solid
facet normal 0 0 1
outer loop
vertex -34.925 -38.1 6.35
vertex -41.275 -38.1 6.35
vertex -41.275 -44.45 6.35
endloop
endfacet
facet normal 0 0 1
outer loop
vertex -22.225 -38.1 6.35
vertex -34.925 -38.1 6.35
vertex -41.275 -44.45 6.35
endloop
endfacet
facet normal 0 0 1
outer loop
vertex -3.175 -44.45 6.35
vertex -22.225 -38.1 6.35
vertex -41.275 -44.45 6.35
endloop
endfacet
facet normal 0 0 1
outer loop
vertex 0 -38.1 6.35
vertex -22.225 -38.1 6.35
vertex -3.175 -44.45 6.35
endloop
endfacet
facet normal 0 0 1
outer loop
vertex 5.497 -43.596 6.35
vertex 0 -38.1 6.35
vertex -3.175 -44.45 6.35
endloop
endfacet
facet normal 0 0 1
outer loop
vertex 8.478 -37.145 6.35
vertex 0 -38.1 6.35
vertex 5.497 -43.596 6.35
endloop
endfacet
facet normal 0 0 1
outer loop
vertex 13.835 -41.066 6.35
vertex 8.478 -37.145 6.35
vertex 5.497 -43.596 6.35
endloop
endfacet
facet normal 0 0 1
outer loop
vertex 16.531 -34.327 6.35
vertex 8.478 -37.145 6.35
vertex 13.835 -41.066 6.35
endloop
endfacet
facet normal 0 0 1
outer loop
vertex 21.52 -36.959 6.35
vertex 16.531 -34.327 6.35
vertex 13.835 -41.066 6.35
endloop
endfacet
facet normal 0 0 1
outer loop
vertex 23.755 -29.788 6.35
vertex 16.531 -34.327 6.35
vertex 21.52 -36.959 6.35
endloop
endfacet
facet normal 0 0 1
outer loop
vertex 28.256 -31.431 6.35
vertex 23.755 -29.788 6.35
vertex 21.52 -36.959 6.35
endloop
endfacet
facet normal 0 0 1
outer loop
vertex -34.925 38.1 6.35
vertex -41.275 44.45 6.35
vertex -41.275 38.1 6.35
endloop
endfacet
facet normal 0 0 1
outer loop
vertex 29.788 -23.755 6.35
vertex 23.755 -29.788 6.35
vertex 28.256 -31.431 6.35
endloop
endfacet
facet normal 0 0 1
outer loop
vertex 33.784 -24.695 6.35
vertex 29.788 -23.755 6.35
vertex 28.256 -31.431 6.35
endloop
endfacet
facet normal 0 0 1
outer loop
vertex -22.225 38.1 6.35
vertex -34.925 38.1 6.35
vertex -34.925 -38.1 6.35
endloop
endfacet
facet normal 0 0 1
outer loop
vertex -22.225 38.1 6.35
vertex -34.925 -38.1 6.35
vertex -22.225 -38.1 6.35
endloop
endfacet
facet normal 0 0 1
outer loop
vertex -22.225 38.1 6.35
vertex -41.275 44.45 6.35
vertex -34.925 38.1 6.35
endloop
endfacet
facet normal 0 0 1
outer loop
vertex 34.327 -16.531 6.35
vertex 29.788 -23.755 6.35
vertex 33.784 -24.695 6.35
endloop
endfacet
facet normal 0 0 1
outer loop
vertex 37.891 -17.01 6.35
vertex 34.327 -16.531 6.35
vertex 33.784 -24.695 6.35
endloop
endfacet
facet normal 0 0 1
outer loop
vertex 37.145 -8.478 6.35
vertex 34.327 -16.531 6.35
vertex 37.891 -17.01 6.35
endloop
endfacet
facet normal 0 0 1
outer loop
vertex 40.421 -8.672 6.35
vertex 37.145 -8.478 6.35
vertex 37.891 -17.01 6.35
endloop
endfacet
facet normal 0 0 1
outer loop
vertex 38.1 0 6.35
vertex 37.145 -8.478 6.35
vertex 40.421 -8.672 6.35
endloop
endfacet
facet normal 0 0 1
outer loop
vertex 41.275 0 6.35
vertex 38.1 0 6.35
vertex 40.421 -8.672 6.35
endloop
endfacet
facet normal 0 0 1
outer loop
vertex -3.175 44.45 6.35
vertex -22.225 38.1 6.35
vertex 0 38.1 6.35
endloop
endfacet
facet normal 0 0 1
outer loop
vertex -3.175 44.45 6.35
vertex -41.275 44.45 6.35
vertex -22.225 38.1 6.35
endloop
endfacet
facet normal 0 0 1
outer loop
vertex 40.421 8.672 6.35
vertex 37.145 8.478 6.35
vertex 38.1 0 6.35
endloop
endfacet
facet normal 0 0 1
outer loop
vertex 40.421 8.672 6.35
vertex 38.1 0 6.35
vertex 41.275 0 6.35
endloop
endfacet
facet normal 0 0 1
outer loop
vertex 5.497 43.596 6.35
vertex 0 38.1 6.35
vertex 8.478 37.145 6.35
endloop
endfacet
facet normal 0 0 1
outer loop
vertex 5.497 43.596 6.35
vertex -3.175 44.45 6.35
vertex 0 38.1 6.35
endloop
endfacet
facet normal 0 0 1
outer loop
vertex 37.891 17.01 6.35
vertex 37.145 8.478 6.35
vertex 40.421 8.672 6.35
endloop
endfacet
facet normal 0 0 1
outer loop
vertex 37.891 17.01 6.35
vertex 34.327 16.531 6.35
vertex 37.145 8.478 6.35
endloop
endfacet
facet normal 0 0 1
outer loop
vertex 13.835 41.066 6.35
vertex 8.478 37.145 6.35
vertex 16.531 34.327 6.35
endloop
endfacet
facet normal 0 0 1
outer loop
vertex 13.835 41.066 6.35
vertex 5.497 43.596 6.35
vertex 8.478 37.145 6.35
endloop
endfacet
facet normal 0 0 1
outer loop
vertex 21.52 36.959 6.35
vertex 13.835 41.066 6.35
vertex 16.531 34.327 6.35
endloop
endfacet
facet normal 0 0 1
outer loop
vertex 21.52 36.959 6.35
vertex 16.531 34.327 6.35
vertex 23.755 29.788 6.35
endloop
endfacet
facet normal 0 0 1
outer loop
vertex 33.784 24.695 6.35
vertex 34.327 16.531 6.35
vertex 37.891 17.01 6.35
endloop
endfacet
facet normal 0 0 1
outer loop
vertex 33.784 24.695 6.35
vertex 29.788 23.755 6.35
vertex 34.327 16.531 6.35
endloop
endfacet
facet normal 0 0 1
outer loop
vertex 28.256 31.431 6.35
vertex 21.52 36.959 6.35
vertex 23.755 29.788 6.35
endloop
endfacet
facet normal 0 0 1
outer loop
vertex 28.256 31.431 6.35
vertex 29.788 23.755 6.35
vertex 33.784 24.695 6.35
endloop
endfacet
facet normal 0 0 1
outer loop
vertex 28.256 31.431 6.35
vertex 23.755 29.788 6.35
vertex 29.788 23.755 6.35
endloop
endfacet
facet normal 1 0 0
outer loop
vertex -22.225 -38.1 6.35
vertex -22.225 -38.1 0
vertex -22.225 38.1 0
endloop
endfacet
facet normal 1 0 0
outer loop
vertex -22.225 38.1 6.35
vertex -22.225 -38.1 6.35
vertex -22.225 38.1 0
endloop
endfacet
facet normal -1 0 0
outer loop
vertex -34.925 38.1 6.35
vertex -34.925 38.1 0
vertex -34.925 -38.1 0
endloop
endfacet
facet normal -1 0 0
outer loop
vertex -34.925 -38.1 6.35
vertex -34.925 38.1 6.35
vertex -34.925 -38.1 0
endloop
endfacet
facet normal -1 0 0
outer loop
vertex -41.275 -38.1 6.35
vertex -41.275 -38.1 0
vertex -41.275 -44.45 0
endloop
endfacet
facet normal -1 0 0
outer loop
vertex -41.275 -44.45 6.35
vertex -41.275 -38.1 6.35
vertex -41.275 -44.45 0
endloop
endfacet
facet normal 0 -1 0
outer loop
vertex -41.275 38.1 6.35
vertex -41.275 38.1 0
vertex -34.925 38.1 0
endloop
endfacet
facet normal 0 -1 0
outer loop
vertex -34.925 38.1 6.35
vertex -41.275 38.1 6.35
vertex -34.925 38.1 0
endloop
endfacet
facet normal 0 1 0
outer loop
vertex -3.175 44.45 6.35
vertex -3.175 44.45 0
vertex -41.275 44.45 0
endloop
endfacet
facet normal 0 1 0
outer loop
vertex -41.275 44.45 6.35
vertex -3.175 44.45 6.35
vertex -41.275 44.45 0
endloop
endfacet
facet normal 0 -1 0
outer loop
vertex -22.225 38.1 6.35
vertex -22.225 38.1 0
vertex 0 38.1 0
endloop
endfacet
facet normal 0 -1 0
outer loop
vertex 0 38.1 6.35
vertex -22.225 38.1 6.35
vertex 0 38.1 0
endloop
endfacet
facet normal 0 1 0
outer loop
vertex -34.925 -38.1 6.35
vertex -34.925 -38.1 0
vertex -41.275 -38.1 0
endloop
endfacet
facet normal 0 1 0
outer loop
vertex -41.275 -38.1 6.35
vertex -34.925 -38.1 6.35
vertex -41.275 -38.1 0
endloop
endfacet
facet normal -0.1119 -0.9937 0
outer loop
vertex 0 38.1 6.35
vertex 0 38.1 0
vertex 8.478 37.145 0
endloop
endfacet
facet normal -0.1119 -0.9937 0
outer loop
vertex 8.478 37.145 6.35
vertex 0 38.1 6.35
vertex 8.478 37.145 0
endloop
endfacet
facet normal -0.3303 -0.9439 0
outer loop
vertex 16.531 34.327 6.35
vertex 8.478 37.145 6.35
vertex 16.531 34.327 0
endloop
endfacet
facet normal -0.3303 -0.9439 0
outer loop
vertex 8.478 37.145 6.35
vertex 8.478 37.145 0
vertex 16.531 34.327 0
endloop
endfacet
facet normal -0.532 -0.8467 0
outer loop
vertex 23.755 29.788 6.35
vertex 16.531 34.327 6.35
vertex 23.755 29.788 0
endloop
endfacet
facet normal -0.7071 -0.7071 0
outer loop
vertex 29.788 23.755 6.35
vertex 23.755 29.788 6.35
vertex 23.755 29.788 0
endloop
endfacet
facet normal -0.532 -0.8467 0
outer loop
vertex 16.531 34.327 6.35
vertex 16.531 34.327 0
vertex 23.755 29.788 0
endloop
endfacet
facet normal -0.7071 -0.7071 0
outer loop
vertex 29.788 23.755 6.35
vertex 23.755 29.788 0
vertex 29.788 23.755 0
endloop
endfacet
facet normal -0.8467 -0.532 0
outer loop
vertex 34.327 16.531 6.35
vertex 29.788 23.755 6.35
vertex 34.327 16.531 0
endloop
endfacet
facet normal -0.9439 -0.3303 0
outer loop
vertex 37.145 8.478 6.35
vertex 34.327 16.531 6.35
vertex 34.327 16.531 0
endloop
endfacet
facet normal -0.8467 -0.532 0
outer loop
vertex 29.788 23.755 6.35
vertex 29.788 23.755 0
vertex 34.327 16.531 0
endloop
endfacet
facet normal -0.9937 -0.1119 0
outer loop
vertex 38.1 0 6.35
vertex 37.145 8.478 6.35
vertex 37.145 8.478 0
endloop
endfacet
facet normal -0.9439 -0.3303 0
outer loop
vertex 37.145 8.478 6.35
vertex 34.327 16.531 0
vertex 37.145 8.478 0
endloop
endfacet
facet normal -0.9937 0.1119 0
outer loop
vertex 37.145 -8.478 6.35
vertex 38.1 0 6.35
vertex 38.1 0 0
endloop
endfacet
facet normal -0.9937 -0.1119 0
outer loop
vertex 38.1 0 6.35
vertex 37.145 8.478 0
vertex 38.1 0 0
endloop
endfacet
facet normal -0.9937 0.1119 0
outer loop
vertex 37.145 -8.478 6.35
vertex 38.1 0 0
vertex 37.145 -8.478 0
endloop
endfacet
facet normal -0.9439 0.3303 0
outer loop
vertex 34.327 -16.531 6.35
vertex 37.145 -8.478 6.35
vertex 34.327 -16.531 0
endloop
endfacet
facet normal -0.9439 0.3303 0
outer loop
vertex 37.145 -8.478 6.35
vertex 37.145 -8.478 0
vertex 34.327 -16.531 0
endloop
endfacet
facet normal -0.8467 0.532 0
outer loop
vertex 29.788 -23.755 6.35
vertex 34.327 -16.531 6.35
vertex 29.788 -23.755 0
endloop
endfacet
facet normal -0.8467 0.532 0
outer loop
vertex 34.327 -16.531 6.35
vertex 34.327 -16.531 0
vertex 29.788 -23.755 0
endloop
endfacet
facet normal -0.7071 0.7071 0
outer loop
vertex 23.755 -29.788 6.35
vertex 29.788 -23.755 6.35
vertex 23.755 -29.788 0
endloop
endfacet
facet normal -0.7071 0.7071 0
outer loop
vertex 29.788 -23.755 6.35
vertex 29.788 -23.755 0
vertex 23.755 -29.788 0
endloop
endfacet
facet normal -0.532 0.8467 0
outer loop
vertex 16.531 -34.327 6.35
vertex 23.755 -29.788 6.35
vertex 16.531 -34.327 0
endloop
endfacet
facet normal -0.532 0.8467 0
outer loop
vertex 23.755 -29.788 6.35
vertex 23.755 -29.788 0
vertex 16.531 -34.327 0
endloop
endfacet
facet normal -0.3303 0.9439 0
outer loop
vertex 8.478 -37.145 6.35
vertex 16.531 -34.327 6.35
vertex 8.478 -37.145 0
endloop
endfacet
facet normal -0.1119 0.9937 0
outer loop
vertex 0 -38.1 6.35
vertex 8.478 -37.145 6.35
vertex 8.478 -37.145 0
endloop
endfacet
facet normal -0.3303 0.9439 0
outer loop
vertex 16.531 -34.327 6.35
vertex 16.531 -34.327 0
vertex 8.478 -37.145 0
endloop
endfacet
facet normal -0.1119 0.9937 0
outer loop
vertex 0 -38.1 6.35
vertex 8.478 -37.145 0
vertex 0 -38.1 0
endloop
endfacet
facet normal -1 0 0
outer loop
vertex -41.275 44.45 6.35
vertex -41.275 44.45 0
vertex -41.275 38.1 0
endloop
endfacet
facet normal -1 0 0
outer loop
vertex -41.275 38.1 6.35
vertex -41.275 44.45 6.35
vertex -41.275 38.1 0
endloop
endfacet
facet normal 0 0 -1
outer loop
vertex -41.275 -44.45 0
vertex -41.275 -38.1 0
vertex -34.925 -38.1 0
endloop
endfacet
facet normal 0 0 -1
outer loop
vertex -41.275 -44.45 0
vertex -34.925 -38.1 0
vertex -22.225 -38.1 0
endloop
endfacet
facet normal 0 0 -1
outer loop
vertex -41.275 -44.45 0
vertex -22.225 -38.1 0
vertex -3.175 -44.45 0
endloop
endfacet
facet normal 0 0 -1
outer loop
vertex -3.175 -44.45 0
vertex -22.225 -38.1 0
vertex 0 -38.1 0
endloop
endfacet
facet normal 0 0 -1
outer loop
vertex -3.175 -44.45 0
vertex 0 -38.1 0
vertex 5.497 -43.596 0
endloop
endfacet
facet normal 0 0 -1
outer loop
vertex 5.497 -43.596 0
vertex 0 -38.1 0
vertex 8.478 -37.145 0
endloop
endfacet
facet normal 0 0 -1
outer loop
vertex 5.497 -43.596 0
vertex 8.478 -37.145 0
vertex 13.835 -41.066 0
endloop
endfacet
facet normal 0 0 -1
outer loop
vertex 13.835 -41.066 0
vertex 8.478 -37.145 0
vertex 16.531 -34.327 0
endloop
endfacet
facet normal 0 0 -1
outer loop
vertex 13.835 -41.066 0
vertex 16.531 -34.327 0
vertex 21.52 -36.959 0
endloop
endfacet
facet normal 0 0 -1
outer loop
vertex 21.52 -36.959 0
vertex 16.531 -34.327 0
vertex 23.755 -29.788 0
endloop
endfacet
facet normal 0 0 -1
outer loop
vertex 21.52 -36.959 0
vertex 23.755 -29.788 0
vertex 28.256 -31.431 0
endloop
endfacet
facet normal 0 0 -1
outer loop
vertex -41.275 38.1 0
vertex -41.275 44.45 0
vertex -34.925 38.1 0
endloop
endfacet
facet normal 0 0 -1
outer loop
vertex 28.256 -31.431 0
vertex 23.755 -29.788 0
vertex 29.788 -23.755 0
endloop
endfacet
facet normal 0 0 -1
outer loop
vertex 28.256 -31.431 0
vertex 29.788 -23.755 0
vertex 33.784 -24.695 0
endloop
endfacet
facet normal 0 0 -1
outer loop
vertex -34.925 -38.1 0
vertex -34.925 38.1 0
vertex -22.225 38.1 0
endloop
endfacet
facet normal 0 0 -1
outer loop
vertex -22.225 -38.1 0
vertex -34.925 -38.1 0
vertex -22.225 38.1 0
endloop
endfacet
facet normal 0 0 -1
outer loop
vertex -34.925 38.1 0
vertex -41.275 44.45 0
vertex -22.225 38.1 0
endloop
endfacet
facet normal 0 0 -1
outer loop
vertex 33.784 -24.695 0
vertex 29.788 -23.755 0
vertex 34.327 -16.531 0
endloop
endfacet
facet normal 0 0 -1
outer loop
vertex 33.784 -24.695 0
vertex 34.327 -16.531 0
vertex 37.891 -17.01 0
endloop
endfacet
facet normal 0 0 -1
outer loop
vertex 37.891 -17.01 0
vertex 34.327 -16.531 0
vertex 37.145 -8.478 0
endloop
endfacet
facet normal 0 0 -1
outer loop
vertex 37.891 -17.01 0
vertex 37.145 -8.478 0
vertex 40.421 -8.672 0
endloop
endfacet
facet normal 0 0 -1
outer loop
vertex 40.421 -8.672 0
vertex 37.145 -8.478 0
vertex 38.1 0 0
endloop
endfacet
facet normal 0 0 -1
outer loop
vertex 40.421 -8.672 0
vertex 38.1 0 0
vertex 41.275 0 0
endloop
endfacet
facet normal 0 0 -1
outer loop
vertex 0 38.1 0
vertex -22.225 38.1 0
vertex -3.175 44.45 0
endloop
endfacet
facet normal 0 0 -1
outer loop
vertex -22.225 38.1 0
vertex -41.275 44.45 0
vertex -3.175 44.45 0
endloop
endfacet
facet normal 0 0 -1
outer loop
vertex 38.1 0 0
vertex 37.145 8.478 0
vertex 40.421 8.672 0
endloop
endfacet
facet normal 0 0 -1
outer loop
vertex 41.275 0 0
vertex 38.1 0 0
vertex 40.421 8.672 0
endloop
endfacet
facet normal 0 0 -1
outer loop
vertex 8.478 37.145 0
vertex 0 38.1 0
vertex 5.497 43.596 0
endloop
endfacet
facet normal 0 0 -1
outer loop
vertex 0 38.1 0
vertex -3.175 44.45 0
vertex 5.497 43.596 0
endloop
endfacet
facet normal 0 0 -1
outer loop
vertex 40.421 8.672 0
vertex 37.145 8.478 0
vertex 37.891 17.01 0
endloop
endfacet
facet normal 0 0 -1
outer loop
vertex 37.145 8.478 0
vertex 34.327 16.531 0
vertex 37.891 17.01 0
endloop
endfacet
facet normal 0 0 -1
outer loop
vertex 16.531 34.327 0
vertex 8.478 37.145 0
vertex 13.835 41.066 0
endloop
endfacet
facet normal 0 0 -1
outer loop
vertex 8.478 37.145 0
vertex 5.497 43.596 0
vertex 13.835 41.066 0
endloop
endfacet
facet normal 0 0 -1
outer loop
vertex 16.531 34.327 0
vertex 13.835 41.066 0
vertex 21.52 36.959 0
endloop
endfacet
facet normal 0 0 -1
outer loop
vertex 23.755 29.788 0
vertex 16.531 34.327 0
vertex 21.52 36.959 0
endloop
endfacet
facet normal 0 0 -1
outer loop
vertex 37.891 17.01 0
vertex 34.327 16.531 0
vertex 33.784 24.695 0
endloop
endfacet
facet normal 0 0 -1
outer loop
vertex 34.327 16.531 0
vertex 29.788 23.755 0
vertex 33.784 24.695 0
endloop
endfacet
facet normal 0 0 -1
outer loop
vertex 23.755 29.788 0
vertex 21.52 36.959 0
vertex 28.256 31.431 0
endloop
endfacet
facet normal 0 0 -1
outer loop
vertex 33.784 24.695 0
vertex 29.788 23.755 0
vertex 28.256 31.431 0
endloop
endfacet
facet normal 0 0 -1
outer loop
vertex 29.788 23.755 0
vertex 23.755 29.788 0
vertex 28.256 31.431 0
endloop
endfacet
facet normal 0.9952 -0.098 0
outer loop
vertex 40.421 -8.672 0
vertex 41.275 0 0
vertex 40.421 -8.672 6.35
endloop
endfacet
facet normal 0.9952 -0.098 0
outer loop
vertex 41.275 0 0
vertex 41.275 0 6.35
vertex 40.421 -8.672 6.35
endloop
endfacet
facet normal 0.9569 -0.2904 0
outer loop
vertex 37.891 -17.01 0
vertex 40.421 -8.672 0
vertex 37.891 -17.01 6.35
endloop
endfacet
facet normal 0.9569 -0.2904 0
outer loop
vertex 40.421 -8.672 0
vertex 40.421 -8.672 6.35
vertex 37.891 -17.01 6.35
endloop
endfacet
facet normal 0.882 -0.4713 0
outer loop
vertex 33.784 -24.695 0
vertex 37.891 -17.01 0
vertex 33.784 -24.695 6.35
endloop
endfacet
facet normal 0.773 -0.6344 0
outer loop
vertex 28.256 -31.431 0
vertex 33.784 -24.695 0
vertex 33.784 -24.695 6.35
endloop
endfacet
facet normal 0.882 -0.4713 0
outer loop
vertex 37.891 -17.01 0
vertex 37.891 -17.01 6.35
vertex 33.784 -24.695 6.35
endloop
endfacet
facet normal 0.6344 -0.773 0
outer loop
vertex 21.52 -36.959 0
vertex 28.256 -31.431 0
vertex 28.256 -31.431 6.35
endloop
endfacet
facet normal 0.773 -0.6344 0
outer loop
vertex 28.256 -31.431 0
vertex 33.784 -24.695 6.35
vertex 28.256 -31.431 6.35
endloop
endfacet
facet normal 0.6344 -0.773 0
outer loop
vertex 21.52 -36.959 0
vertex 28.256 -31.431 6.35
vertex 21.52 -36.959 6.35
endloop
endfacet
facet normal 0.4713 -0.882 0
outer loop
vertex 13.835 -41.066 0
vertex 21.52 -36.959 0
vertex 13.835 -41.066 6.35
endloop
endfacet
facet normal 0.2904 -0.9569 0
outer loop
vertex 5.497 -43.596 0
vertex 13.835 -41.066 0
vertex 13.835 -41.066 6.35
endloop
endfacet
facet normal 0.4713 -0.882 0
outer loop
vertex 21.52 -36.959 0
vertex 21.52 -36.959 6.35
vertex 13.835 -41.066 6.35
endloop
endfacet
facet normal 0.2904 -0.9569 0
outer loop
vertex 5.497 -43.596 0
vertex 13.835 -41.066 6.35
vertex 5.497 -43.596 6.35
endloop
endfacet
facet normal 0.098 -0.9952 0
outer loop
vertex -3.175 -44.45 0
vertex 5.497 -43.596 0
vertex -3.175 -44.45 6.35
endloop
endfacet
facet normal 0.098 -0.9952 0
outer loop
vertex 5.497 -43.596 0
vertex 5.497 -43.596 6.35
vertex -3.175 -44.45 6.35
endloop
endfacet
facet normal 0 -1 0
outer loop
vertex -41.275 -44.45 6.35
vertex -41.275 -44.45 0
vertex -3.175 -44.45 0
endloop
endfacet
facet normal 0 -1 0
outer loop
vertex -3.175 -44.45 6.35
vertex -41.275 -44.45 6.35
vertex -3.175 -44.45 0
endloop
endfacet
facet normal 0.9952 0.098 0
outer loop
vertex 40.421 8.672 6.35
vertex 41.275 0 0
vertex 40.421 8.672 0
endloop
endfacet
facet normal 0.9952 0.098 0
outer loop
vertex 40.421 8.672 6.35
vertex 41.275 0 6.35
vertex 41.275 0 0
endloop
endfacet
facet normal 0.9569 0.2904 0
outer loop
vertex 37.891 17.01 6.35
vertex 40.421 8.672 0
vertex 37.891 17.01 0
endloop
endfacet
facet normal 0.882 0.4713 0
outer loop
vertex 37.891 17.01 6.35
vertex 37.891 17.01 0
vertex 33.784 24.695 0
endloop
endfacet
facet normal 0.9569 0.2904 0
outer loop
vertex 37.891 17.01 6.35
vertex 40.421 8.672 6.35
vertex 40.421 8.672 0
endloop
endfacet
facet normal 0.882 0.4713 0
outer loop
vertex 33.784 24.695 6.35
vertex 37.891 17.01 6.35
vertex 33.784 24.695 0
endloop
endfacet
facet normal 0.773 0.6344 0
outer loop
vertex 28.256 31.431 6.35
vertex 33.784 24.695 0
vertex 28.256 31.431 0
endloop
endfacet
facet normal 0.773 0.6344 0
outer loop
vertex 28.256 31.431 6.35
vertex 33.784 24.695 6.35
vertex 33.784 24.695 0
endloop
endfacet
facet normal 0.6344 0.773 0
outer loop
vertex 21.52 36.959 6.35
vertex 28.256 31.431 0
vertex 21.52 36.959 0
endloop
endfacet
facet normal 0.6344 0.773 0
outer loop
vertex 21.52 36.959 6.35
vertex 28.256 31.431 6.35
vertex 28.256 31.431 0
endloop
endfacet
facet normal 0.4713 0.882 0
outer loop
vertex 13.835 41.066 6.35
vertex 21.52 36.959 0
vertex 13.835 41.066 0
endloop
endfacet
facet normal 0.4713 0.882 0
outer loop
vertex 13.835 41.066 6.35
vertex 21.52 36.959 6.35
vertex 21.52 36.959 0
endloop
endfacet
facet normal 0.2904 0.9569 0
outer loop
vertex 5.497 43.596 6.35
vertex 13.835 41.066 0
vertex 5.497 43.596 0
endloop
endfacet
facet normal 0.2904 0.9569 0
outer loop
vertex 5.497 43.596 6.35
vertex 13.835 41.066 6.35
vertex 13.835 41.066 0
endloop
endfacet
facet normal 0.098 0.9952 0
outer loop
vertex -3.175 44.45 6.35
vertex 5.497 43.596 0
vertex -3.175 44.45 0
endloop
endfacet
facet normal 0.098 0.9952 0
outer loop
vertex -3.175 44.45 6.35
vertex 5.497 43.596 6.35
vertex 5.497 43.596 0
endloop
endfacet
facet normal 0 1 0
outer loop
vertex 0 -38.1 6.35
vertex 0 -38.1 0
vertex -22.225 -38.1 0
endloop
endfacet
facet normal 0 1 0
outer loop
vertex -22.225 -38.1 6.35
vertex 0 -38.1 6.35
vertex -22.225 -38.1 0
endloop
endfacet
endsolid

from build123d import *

# Parameters (mm, degrees)
F1_DEPTH = 6.35
F2_R     = 44.44999


# Not quite as in the source:
# - a fillet or chamfer is up to 0.001 mm smaller than in the source, because OpenCascade refuses the exact size


with BuildPart() as f1:
    # F0 (on Top) → F1 (new body)
    with BuildSketch(Plane.XY):
        Polygon((41.275, -44.45), (41.275, 44.45), (-41.275, 44.45), (-41.275, 38.1), (-34.925, 38.1), (-34.925, -38.1), (-41.275, -38.1), (-41.275, -44.45), align=None)
        with BuildLine():
            Line((0, -38.1), (-22.225, -38.1))
            Line((-22.225, -38.1), (-22.225, 38.1))
            Line((-22.225, 38.1), (0, 38.1))
            ThreePointArc((0, 38.1), (38.1, 0), (0, -38.1))
        make_face(mode=Mode.SUBTRACT)
    extrude(amount=F1_DEPTH)

    # F2 (radius 44.45 in the source; OpenCascade refuses exactly that, so slightly less here)
    f2_edges = [f1.edges().sort_by_distance(p)[0] for p in [
        (41.275, -44.45, 3.175),
        (41.275, 44.45, 3.175),
    ]]
    fillet(f2_edges, radius=F2_R)


solid = f1.part
